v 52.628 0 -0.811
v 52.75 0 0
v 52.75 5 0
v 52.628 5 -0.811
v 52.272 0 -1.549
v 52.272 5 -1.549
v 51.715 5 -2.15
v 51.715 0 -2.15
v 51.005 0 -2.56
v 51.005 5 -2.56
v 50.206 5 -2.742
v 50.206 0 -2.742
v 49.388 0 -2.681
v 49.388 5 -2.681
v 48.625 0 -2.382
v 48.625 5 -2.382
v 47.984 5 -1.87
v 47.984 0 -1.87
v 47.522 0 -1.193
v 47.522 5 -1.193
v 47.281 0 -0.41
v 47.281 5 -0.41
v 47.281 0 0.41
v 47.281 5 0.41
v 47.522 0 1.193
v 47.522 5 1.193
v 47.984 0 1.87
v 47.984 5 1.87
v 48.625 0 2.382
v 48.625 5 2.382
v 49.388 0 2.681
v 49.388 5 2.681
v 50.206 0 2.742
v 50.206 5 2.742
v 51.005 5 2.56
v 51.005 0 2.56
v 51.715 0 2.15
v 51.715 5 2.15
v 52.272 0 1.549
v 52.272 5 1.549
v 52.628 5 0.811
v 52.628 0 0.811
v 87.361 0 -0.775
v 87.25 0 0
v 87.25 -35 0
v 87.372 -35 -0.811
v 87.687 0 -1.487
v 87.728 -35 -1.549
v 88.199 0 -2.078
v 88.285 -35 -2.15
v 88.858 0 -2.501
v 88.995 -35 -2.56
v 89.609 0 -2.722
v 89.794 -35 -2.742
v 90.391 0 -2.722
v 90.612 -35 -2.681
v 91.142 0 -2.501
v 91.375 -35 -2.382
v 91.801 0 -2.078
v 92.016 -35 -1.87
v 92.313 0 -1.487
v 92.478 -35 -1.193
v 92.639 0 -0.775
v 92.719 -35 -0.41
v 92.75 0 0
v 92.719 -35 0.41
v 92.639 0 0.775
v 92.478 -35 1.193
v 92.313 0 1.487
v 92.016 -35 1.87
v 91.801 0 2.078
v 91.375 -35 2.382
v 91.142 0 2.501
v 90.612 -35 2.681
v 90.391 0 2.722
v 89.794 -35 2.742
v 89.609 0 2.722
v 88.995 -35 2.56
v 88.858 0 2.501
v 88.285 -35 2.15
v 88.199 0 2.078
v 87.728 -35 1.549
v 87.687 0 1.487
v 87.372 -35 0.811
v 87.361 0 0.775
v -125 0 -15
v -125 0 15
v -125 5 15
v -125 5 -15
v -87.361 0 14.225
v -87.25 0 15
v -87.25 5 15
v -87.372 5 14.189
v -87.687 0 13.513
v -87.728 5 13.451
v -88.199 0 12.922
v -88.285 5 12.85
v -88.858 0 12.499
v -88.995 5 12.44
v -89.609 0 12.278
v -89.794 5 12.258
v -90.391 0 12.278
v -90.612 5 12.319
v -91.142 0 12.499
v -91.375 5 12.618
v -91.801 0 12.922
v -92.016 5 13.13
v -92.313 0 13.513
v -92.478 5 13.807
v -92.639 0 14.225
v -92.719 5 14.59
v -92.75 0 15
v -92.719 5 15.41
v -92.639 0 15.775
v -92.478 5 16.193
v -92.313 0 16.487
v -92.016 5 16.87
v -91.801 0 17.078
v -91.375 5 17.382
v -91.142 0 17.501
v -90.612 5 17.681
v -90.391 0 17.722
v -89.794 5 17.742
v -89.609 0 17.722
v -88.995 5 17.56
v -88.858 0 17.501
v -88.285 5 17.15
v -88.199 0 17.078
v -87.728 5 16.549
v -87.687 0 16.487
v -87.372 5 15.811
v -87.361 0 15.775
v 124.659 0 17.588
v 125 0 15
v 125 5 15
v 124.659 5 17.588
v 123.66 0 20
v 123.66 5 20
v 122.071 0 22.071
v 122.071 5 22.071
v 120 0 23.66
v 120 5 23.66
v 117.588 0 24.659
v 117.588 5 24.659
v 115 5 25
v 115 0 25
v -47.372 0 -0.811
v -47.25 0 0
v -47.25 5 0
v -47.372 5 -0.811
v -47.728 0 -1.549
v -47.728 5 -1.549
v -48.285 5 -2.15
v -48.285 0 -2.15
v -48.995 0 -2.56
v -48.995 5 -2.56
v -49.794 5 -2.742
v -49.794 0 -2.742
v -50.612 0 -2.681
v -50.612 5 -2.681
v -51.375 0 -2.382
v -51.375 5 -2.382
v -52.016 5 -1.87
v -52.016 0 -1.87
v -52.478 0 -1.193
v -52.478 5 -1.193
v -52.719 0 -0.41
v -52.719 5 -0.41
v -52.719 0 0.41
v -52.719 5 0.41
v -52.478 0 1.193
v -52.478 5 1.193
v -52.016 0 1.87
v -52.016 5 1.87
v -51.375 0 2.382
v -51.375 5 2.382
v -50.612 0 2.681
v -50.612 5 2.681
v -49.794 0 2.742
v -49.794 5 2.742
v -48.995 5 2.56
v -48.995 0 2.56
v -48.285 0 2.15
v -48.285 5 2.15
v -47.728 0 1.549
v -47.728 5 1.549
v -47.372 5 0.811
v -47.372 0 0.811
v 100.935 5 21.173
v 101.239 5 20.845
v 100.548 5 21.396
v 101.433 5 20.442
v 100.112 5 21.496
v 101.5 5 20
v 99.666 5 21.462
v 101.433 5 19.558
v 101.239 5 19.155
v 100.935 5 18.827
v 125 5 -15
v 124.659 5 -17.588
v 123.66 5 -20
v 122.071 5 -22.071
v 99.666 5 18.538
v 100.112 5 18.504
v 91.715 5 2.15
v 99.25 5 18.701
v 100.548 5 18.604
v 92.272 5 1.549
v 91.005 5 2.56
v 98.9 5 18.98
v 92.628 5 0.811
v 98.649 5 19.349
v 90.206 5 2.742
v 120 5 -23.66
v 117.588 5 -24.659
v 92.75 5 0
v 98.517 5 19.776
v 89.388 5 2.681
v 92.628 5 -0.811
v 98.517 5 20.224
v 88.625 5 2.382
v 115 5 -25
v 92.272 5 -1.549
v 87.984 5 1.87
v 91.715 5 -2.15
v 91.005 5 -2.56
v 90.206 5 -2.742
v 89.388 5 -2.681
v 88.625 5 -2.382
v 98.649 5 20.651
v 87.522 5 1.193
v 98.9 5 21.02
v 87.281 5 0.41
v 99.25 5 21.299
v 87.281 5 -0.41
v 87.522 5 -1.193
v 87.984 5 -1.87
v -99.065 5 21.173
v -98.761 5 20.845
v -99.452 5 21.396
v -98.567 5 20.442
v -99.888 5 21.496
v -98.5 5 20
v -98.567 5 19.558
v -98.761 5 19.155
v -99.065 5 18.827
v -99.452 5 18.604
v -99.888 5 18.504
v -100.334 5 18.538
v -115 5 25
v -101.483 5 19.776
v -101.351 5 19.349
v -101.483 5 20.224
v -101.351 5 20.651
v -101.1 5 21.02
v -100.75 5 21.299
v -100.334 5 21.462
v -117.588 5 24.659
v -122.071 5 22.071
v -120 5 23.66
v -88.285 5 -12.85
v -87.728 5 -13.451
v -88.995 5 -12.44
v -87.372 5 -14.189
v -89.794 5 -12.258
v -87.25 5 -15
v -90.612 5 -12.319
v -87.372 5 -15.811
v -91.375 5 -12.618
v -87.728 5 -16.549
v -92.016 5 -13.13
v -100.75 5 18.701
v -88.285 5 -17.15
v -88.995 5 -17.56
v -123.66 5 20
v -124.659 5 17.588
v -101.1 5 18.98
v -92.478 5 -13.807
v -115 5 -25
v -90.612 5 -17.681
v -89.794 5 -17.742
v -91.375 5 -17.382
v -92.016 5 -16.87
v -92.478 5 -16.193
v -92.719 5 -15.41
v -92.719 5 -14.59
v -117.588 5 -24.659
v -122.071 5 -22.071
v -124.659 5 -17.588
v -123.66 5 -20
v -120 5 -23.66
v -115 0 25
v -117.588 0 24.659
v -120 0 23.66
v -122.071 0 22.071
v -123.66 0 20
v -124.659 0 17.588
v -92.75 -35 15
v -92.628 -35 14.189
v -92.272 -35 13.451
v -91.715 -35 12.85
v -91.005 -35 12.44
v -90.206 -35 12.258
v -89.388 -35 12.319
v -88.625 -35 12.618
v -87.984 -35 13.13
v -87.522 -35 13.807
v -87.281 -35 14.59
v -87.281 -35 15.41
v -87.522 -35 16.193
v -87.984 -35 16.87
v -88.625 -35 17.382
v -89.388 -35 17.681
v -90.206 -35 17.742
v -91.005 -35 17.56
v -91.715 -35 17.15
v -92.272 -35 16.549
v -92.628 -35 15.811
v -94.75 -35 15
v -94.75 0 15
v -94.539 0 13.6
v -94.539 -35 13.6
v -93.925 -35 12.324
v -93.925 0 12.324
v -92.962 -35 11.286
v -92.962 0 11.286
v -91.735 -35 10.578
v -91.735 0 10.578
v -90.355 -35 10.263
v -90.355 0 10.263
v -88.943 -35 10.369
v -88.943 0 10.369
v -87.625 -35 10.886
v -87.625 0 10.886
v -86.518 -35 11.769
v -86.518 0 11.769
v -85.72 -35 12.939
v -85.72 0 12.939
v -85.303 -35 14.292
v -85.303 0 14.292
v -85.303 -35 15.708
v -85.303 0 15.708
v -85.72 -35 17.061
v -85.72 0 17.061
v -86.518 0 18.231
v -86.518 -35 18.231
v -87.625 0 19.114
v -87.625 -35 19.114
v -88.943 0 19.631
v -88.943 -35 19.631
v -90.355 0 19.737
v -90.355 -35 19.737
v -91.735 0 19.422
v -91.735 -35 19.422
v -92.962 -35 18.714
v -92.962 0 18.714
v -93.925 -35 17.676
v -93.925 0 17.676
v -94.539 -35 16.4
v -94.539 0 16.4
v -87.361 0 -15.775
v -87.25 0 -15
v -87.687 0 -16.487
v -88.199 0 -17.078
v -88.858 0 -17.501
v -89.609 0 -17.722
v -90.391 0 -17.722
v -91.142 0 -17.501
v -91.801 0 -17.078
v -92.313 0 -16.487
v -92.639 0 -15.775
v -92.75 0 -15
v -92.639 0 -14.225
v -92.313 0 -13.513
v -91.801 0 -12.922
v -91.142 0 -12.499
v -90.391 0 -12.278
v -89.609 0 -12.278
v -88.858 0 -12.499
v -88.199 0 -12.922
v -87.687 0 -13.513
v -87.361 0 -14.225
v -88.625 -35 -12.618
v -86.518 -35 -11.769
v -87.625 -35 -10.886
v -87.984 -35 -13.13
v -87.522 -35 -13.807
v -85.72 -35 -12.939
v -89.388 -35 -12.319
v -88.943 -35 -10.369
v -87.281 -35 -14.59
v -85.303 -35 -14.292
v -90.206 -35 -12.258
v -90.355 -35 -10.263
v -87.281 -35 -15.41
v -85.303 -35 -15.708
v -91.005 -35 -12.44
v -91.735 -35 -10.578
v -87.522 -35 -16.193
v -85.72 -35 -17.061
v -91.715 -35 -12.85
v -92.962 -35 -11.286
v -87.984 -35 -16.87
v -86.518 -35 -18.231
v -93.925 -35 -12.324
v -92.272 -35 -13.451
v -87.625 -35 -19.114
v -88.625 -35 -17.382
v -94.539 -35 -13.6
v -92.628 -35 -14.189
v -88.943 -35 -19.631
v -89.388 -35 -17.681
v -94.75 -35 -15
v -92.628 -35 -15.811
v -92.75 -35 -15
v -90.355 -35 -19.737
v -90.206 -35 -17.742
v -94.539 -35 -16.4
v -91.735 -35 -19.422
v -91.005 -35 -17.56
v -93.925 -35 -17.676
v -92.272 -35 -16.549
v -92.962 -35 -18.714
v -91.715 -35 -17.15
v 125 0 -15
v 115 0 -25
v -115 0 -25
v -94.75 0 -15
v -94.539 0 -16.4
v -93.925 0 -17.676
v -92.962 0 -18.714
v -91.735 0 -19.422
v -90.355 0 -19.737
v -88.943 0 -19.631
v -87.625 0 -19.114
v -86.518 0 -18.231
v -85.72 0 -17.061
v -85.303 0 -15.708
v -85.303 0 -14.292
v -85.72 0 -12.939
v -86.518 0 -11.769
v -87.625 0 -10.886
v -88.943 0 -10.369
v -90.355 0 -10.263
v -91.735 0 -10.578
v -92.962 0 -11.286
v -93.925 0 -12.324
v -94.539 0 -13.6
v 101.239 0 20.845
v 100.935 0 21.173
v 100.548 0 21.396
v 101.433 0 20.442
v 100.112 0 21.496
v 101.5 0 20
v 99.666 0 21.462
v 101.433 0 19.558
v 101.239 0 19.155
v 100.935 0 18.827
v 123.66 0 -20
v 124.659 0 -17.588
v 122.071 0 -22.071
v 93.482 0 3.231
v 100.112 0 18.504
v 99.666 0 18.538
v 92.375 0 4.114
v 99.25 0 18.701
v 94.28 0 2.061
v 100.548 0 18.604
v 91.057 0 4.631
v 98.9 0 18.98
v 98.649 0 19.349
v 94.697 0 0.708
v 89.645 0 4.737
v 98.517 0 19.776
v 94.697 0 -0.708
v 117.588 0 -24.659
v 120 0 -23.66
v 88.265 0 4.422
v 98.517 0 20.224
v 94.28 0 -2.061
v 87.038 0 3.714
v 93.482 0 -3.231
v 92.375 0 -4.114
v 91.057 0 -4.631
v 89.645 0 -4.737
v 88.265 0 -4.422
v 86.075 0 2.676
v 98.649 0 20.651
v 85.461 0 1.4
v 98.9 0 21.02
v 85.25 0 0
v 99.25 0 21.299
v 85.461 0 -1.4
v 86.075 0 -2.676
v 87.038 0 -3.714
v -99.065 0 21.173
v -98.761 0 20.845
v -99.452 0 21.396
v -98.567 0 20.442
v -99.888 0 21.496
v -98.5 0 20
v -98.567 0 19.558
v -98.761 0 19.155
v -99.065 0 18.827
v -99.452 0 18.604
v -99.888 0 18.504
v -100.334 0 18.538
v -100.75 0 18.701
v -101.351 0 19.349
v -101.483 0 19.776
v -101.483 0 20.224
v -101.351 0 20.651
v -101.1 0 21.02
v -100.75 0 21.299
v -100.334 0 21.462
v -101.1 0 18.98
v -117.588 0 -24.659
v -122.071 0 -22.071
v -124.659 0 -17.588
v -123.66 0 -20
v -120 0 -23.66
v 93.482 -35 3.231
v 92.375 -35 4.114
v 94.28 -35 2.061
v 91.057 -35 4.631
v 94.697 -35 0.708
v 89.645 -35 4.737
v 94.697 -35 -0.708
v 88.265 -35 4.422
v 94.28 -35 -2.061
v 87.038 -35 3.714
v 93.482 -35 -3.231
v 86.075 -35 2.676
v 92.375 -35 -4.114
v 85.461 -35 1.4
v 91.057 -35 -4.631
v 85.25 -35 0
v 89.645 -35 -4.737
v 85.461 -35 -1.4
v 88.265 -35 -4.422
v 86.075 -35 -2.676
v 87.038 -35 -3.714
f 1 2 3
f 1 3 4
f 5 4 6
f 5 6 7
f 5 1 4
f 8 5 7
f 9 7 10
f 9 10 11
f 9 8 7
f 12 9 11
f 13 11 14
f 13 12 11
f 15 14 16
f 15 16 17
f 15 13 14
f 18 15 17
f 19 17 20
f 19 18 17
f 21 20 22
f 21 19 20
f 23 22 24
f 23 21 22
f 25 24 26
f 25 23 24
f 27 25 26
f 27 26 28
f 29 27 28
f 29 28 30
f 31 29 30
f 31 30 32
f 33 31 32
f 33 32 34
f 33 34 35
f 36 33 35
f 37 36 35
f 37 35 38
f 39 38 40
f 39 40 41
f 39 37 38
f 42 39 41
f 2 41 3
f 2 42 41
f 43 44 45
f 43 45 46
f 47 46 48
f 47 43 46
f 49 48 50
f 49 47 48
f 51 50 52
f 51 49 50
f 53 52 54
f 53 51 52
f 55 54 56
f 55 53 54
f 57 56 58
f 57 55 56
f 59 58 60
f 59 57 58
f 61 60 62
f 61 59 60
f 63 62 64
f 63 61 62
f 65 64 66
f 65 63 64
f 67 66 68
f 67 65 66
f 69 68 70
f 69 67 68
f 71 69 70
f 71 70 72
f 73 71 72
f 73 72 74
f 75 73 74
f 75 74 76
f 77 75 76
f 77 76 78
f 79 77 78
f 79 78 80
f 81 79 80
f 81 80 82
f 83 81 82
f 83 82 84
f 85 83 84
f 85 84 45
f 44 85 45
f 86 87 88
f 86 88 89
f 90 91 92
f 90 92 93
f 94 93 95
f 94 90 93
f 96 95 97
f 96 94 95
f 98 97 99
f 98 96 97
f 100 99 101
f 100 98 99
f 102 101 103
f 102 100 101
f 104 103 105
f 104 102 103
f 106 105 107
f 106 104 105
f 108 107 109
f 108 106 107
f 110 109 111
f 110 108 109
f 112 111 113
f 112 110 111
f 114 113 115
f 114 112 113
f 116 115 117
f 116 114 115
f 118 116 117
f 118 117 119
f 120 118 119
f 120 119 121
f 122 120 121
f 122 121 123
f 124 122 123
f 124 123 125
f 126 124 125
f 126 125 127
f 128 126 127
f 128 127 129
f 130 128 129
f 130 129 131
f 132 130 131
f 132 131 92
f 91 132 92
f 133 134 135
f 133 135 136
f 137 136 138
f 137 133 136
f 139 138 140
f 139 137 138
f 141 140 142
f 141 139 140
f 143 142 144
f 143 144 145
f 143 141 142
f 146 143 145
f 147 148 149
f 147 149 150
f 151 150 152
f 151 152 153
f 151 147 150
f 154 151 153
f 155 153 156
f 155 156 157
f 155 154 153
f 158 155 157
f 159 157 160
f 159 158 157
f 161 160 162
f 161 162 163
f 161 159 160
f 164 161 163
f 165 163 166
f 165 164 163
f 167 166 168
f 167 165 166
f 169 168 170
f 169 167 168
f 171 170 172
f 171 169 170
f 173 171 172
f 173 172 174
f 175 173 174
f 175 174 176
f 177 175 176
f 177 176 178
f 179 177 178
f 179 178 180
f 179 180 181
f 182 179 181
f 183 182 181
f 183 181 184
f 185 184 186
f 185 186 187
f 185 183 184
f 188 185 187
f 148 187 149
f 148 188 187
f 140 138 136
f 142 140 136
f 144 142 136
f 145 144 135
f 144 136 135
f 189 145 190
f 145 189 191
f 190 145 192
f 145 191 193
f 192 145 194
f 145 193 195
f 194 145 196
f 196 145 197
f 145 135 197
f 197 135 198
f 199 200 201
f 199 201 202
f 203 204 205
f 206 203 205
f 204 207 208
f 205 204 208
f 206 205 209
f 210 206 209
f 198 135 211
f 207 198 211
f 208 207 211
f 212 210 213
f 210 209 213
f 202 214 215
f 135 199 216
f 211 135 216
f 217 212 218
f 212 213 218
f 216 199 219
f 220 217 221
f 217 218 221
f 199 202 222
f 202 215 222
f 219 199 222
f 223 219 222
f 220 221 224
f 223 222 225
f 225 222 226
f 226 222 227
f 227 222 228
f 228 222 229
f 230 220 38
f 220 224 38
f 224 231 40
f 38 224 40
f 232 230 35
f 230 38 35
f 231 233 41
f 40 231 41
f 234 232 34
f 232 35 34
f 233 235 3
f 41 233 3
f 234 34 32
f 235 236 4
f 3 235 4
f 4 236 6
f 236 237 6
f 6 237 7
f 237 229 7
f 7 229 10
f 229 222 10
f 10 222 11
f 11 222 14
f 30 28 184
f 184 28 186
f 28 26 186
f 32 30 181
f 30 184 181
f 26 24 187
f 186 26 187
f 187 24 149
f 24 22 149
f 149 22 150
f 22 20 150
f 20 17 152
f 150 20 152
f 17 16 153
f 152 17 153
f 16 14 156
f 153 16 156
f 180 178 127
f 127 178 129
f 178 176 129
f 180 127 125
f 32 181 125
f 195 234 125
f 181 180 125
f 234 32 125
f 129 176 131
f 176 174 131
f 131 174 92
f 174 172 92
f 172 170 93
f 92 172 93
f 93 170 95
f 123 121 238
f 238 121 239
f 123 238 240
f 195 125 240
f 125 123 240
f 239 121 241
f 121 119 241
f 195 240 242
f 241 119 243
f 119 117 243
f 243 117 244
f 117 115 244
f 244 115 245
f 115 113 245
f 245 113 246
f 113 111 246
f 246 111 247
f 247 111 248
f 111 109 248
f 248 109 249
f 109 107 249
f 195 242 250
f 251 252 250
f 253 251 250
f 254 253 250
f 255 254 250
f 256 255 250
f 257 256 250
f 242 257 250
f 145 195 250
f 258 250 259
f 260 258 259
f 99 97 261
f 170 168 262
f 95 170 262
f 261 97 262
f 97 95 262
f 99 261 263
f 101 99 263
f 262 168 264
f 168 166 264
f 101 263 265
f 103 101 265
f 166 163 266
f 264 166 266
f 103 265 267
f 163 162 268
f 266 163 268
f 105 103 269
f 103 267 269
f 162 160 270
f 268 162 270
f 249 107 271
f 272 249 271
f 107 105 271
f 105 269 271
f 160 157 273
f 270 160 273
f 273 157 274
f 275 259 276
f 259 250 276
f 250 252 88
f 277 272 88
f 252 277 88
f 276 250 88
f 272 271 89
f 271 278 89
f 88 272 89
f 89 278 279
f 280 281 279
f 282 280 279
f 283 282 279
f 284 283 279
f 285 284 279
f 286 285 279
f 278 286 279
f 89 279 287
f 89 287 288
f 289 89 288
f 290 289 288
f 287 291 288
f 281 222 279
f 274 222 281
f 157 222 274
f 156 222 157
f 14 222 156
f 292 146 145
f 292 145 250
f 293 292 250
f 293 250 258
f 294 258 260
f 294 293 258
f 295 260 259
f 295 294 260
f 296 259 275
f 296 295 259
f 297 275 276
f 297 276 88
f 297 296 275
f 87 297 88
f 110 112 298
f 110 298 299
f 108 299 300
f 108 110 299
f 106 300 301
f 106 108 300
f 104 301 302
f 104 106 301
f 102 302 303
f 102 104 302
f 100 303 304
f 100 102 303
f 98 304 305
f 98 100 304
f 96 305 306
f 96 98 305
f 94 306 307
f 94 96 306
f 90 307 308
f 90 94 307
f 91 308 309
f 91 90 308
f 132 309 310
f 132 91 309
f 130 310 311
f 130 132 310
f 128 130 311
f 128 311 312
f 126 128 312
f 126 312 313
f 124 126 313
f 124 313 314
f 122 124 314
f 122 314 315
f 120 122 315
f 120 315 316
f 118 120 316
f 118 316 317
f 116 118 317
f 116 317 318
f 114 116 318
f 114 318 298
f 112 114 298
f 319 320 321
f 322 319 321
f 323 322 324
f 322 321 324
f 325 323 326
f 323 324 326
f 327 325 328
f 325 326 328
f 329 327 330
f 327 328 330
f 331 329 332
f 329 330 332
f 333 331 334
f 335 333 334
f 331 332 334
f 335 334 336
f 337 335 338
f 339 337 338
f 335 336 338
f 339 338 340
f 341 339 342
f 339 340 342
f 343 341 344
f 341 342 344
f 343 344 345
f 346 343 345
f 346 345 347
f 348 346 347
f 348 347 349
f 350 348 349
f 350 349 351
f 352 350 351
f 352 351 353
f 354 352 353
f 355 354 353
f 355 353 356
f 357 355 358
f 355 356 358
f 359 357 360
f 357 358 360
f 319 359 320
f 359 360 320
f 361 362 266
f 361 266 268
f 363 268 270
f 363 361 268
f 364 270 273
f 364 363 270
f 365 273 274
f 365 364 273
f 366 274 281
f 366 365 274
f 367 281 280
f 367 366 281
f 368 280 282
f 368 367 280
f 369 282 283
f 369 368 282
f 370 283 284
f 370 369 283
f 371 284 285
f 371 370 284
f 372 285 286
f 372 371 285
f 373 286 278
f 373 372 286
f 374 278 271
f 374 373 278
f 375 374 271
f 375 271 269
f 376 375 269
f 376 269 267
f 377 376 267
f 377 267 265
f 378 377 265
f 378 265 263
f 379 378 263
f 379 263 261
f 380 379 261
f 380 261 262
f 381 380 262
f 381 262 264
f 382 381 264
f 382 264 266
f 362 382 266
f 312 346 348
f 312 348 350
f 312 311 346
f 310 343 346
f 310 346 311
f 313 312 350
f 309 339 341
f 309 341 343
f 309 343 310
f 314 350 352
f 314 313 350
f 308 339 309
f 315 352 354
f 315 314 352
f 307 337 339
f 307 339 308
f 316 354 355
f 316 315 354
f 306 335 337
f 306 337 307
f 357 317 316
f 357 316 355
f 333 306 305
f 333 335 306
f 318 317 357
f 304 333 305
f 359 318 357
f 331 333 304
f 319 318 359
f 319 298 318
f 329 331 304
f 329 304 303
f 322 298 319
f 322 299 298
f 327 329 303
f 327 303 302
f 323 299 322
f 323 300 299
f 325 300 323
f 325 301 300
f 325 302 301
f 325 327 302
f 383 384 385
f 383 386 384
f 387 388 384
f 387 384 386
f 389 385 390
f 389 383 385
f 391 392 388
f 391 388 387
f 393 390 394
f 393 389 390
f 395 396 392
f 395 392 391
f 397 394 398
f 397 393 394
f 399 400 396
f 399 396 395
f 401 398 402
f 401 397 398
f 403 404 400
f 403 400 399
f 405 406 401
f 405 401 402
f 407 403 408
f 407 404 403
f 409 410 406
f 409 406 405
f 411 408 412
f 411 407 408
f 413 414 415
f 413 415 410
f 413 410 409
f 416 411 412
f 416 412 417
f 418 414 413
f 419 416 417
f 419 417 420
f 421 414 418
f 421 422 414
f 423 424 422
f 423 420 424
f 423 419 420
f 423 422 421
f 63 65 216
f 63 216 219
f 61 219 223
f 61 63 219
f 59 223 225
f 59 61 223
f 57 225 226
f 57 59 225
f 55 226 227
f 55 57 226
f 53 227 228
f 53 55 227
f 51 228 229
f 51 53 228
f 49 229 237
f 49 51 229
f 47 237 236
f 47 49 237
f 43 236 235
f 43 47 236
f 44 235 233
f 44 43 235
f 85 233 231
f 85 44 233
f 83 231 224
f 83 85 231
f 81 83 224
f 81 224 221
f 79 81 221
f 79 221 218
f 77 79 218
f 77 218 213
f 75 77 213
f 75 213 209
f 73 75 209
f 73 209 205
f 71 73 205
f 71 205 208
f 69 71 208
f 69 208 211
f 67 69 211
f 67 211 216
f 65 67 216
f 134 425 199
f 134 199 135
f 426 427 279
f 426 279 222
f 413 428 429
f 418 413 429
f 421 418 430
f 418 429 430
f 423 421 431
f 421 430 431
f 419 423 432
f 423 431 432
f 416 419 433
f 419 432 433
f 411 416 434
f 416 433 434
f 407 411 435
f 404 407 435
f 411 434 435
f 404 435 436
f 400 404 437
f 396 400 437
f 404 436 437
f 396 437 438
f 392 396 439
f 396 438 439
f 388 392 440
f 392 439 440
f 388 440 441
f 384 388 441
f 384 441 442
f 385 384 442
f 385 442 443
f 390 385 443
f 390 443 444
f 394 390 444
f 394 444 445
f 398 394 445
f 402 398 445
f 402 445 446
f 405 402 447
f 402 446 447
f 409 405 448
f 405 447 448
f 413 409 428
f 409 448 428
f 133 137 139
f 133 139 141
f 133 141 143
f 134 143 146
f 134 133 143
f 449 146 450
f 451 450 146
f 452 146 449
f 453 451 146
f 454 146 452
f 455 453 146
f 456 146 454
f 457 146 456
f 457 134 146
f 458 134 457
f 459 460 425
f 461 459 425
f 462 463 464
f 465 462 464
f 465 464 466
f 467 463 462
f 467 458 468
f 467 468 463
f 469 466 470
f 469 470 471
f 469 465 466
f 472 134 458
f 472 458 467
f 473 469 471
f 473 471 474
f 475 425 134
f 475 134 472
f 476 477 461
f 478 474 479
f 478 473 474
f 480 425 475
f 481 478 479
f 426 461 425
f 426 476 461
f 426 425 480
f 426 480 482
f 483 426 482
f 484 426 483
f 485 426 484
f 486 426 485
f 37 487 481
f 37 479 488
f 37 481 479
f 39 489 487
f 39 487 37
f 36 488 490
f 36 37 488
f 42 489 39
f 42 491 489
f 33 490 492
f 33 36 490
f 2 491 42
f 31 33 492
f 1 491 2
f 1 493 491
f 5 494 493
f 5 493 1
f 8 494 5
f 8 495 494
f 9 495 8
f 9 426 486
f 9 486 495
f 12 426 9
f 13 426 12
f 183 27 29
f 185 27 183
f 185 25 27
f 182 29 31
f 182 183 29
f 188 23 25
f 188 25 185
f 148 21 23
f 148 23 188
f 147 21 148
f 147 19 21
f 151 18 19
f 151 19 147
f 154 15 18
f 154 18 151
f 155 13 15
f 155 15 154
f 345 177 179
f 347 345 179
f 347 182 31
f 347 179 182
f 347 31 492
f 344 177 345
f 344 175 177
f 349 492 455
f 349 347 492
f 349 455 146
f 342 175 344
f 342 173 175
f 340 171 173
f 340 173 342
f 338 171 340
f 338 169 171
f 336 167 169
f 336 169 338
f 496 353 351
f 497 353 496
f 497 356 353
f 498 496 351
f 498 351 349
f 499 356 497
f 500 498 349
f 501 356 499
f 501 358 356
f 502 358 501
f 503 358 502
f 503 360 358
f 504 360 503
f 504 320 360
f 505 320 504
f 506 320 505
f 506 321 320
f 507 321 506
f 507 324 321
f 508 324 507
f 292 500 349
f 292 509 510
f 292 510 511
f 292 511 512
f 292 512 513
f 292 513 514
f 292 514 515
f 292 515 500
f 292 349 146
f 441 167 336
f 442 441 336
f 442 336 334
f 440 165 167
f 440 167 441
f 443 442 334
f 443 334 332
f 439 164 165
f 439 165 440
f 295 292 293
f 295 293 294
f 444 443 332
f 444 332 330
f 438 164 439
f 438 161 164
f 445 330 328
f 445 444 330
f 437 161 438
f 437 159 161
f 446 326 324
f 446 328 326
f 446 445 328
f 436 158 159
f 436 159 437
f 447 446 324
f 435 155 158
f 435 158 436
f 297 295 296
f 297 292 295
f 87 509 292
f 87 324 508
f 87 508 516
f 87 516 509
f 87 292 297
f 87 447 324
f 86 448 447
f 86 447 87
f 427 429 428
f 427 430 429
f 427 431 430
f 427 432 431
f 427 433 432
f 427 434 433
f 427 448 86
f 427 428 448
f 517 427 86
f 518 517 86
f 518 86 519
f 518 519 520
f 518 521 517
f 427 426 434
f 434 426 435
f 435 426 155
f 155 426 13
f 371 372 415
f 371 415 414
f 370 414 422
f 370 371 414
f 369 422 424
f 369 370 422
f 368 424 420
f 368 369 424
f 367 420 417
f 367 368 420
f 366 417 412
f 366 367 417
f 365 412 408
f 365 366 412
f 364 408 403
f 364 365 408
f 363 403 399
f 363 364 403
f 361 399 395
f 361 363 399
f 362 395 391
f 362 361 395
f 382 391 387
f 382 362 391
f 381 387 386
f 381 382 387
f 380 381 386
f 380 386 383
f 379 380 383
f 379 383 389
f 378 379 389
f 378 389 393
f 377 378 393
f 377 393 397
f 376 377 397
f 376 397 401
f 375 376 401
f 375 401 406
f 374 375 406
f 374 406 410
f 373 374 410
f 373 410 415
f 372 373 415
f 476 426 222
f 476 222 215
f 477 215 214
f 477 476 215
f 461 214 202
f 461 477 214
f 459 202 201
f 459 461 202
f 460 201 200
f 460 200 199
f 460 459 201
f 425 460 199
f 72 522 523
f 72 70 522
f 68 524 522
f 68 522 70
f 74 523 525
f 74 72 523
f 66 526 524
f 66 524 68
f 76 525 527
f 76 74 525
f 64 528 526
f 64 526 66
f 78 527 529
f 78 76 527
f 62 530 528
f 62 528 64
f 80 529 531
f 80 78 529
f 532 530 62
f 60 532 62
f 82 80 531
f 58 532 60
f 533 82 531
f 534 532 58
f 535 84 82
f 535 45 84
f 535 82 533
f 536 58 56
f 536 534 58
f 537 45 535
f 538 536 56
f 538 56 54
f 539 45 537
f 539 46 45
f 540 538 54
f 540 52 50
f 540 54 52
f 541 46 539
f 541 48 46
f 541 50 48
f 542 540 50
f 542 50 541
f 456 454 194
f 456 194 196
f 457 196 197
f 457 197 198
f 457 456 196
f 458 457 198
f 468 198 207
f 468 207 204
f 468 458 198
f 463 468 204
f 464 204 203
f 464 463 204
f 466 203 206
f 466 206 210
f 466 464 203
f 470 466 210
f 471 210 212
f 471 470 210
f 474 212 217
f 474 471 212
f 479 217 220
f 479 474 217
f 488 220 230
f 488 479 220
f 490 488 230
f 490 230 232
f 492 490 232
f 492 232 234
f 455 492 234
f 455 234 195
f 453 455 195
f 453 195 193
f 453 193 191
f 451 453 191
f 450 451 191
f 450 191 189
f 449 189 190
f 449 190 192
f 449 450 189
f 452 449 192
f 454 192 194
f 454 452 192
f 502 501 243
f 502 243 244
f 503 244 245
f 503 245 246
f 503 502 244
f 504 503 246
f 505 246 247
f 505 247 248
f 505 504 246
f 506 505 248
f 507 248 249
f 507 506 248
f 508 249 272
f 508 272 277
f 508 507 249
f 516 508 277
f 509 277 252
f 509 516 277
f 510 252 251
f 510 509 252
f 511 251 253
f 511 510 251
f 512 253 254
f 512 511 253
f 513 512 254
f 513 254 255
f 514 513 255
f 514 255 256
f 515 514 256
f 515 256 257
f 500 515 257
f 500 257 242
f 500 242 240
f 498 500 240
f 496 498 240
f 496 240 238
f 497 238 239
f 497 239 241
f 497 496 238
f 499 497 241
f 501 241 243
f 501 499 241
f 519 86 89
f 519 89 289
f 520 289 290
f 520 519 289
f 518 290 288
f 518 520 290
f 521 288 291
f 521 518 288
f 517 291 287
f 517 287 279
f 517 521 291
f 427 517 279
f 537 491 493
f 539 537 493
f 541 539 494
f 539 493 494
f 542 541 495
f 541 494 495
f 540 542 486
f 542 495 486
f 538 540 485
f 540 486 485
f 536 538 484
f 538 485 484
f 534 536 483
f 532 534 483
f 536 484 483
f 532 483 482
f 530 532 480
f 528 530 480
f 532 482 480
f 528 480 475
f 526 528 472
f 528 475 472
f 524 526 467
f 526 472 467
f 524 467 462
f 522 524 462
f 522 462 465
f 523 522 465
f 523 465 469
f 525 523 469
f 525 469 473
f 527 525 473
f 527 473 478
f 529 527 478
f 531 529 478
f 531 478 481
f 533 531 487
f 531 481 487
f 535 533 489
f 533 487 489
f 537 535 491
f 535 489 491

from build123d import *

# Parameters (mm, degrees)
SKETCH1_R           = 2.75
SKETCH1_R_2         = 1.5
BOSS_EXTRUDE1_DEPTH = 5
SKETCH2_R           = 4.75
SKETCH2_R_2         = 2.75
BOSS_EXTRUDE2_DEPTH = 35


with BuildPart() as part:
    # Sketch1 → Boss-Extrude1 (new body)
    with BuildSketch(Plane(origin=(0, 0, 0), x_dir=(1, 0, 0), z_dir=(0, 1, 0))):
        with BuildLine():
            Line((-115, 25), (115, 25))
            ThreePointArc((115, 25), (122.071067812, 22.071067812), (125, 15))
            Line((125, 15), (125, -15))
            ThreePointArc((125, -15), (122.071067812, -22.071067812), (115, -25))
            Line((115, -25), (-115, -25))
            ThreePointArc((-115, -25), (-122.071067812, -22.071067812), (-125, -15))
            Line((-125, -15), (-125, 15))
            ThreePointArc((-125, 15), (-122.071067812, 22.071067812), (-115, 25))
        make_face()
        with Locations((90, 0)):
            Circle(SKETCH1_R, mode=Mode.SUBTRACT)
        with Locations((-90, 15)):
            Circle(SKETCH1_R, mode=Mode.SUBTRACT)
        with Locations((-50, 0)):
            Circle(SKETCH1_R, mode=Mode.SUBTRACT)
        with Locations((50, 0)):
            Circle(SKETCH1_R, mode=Mode.SUBTRACT)
        with Locations((-90, -15)):
            Circle(SKETCH1_R, mode=Mode.SUBTRACT)
        with Locations((-100, -20)):
            Circle(SKETCH1_R_2, mode=Mode.SUBTRACT)
        with Locations((100, -20)):
            Circle(SKETCH1_R_2, mode=Mode.SUBTRACT)
    extrude(amount=BOSS_EXTRUDE1_DEPTH)

    # Sketch2 → Boss-Extrude2 (add)
    with BuildSketch(Plane(origin=(0, 0, 0), x_dir=(-1, 0, 0), z_dir=(0, -1, 0))):
        with Locations((90, -15)):
            Circle(SKETCH2_R)
        with Locations((90, -15)):
            Circle(SKETCH2_R_2, mode=Mode.SUBTRACT)
        with Locations((90, 15)):
            Circle(SKETCH2_R)
        with Locations((90, 15)):
            Circle(SKETCH2_R_2, mode=Mode.SUBTRACT)
        with Locations((-90, 0)):
            Circle(SKETCH2_R)
        with Locations((-90, 0)):
            Circle(SKETCH2_R_2, mode=Mode.SUBTRACT)
    extrude(amount=BOSS_EXTRUDE2_DEPTH)


solid = part.part
